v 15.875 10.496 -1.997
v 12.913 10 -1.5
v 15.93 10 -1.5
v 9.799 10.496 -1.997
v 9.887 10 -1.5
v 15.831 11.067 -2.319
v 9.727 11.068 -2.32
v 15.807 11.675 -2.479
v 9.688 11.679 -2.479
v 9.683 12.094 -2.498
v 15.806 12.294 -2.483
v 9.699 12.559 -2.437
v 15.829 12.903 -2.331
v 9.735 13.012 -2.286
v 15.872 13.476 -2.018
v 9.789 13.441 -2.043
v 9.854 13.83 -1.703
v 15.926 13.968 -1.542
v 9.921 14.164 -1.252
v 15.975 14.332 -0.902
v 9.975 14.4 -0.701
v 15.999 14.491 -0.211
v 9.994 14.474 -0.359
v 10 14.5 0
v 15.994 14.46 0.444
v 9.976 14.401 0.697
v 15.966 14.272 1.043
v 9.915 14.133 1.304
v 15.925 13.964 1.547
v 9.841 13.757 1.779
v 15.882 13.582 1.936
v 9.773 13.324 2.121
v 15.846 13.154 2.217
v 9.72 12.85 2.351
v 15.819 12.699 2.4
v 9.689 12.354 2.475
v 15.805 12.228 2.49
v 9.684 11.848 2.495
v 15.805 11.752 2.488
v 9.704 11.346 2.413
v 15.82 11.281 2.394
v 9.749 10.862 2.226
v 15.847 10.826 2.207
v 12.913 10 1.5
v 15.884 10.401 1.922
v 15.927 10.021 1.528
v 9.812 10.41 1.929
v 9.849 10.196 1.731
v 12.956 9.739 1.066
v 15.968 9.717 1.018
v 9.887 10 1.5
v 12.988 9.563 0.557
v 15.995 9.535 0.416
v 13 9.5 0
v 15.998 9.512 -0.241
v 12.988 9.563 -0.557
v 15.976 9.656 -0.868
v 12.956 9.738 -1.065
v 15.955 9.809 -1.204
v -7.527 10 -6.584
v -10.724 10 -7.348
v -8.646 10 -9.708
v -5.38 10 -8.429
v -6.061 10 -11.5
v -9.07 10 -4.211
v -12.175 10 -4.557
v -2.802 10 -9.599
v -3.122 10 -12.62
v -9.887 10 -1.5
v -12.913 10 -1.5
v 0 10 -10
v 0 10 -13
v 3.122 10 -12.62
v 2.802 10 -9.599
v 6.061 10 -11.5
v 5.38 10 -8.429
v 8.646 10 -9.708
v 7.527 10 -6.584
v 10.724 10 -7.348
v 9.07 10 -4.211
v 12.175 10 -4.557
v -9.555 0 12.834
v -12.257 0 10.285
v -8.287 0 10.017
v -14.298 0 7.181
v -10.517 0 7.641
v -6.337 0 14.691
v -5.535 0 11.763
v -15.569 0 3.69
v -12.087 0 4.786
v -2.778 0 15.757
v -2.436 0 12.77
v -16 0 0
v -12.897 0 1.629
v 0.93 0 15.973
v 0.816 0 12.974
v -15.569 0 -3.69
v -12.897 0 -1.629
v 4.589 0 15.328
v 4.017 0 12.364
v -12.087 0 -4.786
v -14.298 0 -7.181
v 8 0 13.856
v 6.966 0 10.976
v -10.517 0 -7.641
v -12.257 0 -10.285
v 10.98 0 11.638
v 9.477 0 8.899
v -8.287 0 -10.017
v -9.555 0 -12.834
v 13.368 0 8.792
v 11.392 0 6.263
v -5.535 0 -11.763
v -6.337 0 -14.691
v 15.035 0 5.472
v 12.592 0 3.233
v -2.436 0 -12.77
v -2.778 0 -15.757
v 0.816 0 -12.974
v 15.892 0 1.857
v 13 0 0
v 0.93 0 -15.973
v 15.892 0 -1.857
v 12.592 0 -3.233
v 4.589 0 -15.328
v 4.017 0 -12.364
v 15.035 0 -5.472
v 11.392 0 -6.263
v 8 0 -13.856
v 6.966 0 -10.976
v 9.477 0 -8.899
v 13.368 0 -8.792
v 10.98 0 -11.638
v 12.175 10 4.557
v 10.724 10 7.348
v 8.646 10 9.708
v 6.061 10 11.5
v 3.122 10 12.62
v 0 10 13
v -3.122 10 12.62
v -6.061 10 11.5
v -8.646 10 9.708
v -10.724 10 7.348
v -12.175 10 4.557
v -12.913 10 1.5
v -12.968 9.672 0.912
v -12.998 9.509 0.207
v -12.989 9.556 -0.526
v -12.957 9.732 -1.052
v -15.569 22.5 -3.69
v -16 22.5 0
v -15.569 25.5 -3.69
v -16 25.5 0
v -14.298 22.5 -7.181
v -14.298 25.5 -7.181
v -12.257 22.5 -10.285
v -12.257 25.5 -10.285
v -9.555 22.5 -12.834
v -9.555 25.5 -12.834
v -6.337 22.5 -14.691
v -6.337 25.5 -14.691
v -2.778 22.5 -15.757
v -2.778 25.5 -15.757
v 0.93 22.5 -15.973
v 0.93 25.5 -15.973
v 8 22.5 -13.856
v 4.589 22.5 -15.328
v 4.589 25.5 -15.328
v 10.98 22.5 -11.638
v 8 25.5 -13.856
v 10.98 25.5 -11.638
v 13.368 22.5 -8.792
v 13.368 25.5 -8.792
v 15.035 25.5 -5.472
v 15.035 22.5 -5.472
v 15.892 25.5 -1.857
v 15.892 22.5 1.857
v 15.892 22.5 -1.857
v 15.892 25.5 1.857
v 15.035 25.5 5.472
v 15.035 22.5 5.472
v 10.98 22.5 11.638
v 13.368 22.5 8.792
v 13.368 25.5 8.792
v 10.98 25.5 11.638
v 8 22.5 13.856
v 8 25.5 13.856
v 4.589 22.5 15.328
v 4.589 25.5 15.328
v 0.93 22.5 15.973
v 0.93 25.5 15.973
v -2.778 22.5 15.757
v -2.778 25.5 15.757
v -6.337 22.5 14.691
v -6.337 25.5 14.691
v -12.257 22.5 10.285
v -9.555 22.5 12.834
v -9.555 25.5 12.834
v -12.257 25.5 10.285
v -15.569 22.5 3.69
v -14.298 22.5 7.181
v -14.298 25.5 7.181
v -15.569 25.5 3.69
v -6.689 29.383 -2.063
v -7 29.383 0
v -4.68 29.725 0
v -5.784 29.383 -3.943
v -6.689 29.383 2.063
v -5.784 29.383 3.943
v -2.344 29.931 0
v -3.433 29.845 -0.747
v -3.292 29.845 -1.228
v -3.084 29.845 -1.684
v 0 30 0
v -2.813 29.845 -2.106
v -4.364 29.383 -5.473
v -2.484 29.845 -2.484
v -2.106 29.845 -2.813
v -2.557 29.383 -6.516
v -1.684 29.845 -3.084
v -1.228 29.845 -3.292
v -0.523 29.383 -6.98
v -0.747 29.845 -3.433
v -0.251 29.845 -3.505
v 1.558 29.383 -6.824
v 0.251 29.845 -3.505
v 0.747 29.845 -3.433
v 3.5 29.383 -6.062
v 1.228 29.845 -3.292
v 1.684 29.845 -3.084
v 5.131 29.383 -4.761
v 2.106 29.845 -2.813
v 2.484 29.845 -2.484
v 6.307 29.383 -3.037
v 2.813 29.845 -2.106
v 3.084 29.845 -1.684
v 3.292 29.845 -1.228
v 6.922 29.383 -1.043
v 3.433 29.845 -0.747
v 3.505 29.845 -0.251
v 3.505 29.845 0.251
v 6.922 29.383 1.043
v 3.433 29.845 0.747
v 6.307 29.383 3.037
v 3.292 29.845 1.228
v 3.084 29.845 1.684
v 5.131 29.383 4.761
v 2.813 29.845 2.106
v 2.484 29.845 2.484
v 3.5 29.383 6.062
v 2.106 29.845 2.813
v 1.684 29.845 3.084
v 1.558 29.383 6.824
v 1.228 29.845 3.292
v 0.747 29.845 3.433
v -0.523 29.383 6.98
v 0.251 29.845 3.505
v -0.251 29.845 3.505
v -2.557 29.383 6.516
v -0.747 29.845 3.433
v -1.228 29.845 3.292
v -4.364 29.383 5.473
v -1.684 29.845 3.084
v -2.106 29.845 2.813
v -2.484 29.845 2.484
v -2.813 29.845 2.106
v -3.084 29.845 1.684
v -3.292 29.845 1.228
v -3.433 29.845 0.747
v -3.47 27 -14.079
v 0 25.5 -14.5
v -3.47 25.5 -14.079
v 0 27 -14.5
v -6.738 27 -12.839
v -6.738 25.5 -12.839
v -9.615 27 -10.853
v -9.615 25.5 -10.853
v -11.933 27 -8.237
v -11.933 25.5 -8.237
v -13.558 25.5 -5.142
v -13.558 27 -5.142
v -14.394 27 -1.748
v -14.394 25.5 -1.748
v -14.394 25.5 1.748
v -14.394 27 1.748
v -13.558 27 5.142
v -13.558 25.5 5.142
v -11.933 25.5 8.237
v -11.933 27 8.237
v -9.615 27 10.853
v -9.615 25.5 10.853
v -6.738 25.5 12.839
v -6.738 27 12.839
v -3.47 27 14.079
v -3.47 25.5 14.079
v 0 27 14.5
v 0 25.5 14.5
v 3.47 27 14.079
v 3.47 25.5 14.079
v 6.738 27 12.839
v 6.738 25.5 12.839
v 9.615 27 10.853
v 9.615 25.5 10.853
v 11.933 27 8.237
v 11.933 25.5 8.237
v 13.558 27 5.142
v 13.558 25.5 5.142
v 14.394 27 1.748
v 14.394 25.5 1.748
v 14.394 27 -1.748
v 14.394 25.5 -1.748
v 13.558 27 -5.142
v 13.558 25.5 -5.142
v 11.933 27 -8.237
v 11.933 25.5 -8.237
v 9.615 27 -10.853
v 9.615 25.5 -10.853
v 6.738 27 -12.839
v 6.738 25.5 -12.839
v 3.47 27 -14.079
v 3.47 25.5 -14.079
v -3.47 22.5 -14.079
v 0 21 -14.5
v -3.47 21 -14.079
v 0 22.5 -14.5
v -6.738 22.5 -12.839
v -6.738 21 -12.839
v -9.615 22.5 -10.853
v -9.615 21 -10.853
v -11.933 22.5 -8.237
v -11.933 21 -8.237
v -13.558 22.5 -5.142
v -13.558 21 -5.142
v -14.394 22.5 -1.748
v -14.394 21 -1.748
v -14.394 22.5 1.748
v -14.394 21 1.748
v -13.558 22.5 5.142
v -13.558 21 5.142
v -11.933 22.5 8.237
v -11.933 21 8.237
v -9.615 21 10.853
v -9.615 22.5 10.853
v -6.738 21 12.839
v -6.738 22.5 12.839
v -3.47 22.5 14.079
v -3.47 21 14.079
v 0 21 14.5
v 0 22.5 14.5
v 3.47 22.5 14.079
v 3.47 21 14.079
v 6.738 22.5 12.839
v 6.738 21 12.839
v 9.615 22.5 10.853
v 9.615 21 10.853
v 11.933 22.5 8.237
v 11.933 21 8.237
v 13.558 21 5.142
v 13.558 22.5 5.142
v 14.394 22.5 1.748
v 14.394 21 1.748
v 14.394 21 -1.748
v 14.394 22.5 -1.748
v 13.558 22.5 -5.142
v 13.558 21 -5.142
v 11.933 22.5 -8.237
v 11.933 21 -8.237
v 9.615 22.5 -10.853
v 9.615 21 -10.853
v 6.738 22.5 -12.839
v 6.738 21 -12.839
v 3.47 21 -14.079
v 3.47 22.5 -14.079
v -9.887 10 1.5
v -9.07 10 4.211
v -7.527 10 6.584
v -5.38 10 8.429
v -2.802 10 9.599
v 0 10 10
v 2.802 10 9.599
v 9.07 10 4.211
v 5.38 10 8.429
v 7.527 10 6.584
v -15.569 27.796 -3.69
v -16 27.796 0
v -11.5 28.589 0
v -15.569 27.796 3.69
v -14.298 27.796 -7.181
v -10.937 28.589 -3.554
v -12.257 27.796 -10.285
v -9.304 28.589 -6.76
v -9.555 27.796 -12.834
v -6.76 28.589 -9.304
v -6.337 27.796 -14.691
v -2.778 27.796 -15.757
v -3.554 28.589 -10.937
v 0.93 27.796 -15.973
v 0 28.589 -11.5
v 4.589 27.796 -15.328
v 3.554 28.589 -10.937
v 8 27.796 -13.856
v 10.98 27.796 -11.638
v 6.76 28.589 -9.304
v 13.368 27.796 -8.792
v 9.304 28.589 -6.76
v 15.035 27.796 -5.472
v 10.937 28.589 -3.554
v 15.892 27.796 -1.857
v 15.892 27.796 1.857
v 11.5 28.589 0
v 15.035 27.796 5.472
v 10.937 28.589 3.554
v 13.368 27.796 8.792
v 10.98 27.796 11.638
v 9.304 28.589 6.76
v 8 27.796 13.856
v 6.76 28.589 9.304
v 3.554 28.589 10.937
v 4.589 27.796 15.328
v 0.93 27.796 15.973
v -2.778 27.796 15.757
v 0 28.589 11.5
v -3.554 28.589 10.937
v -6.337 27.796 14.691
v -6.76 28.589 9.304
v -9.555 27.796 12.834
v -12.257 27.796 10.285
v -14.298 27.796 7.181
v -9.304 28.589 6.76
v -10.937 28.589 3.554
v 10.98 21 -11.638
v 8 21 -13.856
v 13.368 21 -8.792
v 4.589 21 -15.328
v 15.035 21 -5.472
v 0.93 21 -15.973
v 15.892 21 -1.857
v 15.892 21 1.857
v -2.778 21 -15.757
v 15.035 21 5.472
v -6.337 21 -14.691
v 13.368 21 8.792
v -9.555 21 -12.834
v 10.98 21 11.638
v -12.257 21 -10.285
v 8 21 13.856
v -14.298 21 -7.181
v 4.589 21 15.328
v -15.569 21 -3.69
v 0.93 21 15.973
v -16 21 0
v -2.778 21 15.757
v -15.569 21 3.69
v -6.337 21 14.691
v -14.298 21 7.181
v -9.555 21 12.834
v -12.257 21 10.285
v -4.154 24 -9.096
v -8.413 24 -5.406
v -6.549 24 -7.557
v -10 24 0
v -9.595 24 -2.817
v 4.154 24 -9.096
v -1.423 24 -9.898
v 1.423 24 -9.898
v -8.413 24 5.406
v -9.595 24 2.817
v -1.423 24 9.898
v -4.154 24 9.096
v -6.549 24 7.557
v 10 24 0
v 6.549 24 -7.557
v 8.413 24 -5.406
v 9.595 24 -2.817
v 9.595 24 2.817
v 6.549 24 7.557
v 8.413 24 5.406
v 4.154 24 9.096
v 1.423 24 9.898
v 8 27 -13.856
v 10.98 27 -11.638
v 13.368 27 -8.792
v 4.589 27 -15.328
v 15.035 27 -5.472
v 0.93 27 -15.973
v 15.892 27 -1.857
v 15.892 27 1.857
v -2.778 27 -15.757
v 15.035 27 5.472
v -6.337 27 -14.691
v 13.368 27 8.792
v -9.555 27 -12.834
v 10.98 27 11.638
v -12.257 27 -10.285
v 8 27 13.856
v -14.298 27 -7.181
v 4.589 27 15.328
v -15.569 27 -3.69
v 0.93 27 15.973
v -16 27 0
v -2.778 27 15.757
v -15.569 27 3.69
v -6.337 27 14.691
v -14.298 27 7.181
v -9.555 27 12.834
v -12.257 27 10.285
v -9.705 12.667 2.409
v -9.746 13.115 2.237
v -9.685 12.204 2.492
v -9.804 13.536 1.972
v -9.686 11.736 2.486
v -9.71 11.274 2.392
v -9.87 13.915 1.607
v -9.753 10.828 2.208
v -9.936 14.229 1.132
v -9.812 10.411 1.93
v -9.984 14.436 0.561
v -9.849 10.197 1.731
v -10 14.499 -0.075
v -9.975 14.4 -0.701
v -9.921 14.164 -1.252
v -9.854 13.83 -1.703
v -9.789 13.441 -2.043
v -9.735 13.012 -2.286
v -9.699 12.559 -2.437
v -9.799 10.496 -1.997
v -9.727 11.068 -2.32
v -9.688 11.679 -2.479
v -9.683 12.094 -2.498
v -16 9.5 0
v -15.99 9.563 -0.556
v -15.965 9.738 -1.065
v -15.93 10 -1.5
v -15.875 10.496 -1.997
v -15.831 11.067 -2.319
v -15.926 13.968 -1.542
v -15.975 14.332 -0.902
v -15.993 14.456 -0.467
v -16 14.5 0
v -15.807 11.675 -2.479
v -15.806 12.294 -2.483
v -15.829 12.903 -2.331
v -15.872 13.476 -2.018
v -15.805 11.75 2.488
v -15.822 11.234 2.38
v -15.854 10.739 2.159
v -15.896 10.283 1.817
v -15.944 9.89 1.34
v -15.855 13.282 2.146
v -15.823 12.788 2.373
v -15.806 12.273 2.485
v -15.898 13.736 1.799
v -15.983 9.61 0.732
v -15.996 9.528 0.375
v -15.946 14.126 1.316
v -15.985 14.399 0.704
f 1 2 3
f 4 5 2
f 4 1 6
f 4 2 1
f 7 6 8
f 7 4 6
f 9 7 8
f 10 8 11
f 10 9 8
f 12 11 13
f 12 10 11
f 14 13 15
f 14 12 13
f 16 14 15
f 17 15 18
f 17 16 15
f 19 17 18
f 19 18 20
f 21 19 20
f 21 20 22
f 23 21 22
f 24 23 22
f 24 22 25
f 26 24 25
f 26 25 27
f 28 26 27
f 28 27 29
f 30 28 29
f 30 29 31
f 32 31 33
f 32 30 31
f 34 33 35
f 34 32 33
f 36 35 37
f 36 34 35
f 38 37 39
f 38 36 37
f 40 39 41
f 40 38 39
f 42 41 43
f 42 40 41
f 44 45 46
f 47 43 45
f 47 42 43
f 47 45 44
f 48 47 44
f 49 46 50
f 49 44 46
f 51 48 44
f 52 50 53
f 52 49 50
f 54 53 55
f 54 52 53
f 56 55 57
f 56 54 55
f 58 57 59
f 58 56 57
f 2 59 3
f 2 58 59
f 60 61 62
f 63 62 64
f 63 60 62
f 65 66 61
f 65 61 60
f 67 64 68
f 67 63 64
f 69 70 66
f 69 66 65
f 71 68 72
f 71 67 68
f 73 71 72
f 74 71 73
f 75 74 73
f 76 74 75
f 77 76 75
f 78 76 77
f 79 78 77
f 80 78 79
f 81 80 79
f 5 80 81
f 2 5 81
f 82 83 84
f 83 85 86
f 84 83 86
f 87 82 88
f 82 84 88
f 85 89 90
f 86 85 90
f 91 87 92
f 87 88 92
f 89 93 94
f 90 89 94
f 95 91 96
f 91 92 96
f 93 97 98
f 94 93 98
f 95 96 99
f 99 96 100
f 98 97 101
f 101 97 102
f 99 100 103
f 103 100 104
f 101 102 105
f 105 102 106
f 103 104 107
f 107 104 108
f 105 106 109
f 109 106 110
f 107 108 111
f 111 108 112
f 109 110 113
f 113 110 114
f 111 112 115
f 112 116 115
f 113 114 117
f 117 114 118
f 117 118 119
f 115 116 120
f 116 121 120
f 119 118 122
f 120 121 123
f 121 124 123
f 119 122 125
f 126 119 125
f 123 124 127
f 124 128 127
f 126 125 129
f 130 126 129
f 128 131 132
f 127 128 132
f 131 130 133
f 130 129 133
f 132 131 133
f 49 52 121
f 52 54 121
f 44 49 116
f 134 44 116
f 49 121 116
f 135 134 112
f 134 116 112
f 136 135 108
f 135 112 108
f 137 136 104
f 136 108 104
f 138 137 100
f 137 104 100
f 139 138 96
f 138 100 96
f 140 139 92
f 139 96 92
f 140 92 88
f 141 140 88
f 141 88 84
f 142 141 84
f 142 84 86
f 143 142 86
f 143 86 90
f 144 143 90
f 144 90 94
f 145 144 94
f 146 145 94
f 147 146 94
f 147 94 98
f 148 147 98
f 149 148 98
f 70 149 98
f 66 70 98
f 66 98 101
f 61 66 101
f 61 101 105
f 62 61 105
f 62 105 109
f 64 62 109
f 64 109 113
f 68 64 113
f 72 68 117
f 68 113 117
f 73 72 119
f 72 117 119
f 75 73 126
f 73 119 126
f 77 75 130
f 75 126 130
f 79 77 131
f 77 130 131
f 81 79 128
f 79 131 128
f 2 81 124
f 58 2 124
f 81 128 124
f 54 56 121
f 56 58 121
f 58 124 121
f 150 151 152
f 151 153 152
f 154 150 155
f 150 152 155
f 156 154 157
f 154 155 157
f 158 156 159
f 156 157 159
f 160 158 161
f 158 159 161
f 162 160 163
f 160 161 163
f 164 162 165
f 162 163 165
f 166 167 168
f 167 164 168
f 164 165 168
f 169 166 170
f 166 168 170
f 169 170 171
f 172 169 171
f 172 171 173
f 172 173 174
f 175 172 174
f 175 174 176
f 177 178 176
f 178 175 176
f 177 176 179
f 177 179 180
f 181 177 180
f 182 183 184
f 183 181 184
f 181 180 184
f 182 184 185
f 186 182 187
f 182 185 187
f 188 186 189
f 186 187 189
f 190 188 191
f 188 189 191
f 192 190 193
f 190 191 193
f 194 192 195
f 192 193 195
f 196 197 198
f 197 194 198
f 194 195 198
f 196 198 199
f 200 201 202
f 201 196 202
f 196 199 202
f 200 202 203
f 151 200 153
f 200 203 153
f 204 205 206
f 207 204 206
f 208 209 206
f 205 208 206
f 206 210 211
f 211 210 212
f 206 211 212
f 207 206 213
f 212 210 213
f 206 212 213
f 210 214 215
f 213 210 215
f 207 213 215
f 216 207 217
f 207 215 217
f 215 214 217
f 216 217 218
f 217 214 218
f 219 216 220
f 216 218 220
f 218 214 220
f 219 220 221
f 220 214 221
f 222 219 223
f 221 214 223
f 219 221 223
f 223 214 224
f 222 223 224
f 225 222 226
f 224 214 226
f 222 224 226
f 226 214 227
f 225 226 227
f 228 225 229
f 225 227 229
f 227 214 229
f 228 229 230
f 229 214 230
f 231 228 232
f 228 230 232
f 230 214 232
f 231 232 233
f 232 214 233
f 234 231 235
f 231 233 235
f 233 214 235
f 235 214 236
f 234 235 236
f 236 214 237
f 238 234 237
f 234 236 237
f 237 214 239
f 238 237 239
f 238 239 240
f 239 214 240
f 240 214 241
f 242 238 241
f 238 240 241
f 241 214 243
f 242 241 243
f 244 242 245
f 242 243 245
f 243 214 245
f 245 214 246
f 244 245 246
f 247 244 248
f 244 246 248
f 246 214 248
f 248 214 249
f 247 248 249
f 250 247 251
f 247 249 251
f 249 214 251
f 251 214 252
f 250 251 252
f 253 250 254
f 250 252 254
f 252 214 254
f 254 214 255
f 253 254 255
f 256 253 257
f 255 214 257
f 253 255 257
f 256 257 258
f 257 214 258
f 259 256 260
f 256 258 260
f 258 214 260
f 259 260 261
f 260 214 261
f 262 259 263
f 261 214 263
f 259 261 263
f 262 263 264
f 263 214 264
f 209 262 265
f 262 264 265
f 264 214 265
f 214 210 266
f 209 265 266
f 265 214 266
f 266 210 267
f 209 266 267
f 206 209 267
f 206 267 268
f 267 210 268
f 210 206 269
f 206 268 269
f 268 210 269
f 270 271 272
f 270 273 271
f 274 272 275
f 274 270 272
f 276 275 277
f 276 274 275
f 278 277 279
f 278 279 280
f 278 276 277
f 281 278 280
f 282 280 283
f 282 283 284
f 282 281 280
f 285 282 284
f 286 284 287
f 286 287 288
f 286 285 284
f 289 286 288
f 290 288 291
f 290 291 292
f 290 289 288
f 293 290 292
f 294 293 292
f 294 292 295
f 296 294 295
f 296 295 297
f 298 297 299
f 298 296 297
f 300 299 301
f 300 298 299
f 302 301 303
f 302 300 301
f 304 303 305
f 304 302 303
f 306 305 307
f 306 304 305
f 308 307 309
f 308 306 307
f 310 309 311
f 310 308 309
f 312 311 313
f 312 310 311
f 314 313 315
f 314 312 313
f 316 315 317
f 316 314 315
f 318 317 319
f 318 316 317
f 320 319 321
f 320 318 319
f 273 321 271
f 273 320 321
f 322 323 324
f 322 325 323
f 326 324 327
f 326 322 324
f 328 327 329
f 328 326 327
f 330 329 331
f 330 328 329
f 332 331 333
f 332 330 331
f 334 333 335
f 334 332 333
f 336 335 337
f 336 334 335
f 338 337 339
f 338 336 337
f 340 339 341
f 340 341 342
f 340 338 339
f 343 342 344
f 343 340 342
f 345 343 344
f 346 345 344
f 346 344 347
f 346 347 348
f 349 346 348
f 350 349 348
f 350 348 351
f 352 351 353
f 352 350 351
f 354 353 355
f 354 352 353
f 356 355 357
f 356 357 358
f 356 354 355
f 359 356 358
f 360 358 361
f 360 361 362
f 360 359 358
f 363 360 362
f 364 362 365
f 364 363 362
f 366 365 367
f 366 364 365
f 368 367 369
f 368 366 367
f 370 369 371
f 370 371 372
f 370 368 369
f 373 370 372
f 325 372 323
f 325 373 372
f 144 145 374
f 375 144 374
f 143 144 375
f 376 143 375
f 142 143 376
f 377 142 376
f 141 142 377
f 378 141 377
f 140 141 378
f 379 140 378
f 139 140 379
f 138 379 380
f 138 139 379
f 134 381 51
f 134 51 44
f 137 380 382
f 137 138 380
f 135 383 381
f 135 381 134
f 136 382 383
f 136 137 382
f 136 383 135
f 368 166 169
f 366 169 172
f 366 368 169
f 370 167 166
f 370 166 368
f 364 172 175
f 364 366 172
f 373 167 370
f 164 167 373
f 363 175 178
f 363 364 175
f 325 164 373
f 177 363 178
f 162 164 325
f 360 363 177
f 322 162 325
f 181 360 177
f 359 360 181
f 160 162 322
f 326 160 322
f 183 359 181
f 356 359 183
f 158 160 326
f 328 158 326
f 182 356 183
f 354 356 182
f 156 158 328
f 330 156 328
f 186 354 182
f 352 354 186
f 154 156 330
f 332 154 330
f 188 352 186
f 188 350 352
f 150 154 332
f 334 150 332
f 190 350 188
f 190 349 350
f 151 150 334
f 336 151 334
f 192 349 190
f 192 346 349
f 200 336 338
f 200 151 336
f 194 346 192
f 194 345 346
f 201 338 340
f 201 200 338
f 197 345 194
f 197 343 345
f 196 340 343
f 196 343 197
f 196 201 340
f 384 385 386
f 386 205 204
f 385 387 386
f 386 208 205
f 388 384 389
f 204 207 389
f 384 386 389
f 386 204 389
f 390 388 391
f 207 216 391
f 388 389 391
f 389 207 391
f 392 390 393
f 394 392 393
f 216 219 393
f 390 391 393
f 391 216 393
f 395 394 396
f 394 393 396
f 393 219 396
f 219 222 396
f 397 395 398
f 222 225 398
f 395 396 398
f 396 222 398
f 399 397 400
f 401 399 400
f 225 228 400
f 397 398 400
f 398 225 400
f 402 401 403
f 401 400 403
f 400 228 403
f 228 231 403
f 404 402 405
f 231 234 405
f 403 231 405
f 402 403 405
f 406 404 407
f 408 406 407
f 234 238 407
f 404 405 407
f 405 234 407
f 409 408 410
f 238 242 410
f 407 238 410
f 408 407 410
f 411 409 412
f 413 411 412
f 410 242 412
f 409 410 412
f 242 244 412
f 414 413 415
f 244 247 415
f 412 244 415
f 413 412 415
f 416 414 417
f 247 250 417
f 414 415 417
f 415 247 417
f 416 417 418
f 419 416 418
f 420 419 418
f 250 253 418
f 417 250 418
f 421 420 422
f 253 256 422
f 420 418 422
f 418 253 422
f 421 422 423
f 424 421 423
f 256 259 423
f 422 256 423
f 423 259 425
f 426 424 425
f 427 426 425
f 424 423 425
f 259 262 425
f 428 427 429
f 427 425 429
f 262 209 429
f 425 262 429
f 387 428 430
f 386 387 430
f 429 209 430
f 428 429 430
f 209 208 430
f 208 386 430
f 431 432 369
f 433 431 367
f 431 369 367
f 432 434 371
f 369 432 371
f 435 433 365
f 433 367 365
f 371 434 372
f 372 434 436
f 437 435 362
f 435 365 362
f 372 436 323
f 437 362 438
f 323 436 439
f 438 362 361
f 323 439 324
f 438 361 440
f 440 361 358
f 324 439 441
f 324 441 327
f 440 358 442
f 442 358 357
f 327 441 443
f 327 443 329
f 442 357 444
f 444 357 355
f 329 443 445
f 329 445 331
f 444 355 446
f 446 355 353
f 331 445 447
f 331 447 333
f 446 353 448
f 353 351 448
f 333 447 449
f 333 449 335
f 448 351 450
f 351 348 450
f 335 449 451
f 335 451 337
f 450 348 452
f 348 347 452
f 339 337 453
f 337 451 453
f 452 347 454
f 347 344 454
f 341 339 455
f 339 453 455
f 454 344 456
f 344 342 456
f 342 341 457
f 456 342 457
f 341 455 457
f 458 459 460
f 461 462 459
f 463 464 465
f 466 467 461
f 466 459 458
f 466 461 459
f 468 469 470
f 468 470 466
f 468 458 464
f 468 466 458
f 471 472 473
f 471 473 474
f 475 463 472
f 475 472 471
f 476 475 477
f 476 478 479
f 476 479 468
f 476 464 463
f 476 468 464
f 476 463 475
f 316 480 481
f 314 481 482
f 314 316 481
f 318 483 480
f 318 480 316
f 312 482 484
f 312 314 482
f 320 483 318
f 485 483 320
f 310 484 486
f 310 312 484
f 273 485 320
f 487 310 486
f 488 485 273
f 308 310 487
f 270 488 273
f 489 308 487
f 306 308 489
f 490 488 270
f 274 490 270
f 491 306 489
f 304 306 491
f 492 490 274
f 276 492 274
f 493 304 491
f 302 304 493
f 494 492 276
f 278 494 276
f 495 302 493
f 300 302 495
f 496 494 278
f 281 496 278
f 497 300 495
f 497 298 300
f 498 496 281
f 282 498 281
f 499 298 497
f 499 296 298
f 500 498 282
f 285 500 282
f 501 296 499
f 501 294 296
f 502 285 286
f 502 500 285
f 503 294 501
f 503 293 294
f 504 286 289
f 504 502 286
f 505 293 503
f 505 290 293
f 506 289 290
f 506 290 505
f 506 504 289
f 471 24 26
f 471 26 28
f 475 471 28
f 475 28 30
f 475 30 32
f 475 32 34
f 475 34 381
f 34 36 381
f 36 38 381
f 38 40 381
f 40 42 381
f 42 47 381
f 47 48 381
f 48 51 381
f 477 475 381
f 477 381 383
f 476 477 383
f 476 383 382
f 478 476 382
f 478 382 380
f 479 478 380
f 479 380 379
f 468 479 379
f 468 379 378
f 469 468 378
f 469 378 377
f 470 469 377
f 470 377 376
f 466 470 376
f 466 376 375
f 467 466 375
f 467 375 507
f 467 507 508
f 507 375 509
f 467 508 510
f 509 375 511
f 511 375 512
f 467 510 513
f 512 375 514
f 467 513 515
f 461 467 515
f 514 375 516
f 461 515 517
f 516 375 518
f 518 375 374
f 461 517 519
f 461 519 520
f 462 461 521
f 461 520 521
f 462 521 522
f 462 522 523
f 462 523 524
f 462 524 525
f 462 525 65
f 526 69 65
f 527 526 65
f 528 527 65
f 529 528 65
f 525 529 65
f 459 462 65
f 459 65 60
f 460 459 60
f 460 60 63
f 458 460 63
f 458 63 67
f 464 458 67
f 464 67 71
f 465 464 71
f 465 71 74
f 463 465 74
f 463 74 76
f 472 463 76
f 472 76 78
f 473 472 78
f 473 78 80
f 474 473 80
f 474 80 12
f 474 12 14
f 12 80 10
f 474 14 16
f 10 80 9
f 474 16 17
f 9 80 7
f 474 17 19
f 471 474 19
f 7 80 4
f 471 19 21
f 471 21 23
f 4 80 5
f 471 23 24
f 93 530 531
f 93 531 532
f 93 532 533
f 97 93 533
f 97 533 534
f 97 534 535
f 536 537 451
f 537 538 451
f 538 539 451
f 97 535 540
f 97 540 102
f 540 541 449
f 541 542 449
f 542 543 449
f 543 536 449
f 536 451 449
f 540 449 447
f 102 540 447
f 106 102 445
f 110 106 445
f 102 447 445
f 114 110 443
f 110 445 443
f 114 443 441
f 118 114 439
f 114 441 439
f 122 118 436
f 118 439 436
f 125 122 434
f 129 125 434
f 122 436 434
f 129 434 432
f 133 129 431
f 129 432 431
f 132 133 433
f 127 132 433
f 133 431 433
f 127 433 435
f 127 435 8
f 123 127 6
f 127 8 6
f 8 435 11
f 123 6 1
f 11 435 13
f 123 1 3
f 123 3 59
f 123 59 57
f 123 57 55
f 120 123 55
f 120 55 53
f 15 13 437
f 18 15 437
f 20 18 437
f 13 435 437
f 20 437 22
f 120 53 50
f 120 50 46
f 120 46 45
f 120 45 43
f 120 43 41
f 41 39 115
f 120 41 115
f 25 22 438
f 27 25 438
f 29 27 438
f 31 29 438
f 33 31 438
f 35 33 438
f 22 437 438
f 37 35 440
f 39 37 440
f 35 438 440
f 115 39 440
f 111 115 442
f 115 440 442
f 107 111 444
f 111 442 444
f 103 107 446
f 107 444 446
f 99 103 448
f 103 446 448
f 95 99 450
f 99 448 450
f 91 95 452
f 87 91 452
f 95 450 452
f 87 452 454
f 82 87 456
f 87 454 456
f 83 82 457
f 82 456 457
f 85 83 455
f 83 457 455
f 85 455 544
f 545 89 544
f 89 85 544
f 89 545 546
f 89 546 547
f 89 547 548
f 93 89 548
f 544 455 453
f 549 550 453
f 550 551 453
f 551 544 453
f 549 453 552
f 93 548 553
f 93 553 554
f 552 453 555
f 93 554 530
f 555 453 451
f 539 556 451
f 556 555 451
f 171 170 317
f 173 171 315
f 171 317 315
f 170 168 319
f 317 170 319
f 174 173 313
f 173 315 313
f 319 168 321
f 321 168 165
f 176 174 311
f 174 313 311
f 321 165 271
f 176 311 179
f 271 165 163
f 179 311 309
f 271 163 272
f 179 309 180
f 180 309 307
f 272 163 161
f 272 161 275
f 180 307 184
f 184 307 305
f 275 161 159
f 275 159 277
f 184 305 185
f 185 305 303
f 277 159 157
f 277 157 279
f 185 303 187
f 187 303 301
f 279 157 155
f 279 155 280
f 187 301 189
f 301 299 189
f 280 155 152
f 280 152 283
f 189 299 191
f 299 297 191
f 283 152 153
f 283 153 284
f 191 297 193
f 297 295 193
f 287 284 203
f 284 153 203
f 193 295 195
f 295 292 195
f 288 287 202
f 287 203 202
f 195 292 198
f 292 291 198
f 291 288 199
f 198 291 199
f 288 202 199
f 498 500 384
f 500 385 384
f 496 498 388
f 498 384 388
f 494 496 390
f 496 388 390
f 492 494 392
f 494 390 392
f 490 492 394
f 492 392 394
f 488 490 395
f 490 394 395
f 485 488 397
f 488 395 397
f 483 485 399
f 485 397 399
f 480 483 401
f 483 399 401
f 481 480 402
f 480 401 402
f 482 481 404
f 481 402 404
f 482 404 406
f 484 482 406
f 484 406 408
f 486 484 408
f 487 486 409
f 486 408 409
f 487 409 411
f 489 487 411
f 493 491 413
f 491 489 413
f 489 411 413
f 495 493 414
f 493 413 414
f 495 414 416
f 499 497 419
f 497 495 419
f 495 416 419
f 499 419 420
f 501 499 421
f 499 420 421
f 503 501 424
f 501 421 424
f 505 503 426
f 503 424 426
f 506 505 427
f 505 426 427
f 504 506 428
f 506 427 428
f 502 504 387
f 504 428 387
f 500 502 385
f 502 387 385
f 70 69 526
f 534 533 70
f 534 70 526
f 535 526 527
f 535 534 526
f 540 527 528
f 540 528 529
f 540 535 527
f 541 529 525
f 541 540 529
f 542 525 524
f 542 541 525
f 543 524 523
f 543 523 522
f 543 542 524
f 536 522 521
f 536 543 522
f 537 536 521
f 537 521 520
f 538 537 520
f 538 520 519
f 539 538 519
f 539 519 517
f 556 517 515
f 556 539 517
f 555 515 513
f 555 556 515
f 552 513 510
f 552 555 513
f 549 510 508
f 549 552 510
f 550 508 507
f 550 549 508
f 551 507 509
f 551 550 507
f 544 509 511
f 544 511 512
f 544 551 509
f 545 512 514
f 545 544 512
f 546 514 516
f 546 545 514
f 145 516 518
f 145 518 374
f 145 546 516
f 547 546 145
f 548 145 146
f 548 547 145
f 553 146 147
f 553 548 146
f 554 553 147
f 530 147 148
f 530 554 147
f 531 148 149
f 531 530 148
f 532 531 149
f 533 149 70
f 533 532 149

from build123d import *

# Parameters (mm, degrees)
SKETCH2_W               = 3.590975848
SKETCH2_H               = 1.5
SKETCH2_W_2             = 2.734034887
SKETCH3_R               = 10
CUT_EXTRUDE1_DEPTH      = 24
SKETCH4_R               = 13
CUT_EXTRUDE2_DEPTH      = 10
CUT_EXTRUDE3_DEPTH      = 38.576588456
CUT_EXTRUDE3_DEPTH_BACK = 38.576588456
SKETCH5_R               = 2.5


with BuildPart() as part:
    # Sketch1 → Revolve1 (revolve)
    with BuildSketch(Plane.XY, mode=Mode.PRIVATE) as revolve1_sk:
        with BuildLine():
            Line((0, 0), (16, 0))
            Line((16, 0), (16, 27.795794509))
            Line((16, 27.795794509), (7, 29.382737335))
            ThreePointArc((7, 29.382737335), (3.513581264, 29.845385513), (0, 30))
            Line((0, 30), (0, 0))
        make_face()
    revolve(revolve1_sk.sketch.rotate(Axis((0, 30, 0), (0, -1, 0)), 180), axis=Axis((0, 30, 0), (0, -1, 0)))

    # Sketch2 → Cut-Revolve1 (revolve, cut)
    with BuildSketch(Plane.XY, mode=Mode.PRIVATE) as cut_revolve1_sk:
        with Locations((16.295487924, 26.25)):
            Rectangle(SKETCH2_W, SKETCH2_H)
        with Locations((15.867017443, 21.75)):
            Rectangle(SKETCH2_W_2, SKETCH2_H)
    revolve(cut_revolve1_sk.sketch.rotate(Axis((0, 0, 0), (0, 1, 0)), 90), axis=Axis((0, 0, 0), (0, 1, 0)), mode=Mode.SUBTRACT)

    # Sketch3 → Cut-Extrude1 (cut)
    with BuildSketch(Plane.XZ):
        Circle(SKETCH3_R)
    extrude(amount=-CUT_EXTRUDE1_DEPTH, mode=Mode.SUBTRACT)

    # Sketch4 → Cut-Extrude2 (cut)
    with BuildSketch(Plane(origin=(0, 0, 0), x_dir=(-1, 0, 0), z_dir=(0, -1, 0))):
        with Locations(Location((0, 0, 0), (0, 0, 180))):
            Circle(SKETCH4_R)
    extrude(amount=-CUT_EXTRUDE2_DEPTH, mode=Mode.SUBTRACT)

    # Sketch5 → Cut-Extrude3 (cut, two sides: drawn at the far end of the back side and taken through both)
    with BuildSketch(Plane(origin=(0, 0, 0), x_dir=(0, 0, -1), z_dir=(1, 0, 0)).offset(-CUT_EXTRUDE3_DEPTH_BACK)):
        with Locations(Location((0, 12, 0), (0, 0, 306.869897646))):
            Circle(SKETCH5_R)
    extrude(amount=CUT_EXTRUDE3_DEPTH + CUT_EXTRUDE3_DEPTH_BACK, mode=Mode.SUBTRACT)


solid = part.part
